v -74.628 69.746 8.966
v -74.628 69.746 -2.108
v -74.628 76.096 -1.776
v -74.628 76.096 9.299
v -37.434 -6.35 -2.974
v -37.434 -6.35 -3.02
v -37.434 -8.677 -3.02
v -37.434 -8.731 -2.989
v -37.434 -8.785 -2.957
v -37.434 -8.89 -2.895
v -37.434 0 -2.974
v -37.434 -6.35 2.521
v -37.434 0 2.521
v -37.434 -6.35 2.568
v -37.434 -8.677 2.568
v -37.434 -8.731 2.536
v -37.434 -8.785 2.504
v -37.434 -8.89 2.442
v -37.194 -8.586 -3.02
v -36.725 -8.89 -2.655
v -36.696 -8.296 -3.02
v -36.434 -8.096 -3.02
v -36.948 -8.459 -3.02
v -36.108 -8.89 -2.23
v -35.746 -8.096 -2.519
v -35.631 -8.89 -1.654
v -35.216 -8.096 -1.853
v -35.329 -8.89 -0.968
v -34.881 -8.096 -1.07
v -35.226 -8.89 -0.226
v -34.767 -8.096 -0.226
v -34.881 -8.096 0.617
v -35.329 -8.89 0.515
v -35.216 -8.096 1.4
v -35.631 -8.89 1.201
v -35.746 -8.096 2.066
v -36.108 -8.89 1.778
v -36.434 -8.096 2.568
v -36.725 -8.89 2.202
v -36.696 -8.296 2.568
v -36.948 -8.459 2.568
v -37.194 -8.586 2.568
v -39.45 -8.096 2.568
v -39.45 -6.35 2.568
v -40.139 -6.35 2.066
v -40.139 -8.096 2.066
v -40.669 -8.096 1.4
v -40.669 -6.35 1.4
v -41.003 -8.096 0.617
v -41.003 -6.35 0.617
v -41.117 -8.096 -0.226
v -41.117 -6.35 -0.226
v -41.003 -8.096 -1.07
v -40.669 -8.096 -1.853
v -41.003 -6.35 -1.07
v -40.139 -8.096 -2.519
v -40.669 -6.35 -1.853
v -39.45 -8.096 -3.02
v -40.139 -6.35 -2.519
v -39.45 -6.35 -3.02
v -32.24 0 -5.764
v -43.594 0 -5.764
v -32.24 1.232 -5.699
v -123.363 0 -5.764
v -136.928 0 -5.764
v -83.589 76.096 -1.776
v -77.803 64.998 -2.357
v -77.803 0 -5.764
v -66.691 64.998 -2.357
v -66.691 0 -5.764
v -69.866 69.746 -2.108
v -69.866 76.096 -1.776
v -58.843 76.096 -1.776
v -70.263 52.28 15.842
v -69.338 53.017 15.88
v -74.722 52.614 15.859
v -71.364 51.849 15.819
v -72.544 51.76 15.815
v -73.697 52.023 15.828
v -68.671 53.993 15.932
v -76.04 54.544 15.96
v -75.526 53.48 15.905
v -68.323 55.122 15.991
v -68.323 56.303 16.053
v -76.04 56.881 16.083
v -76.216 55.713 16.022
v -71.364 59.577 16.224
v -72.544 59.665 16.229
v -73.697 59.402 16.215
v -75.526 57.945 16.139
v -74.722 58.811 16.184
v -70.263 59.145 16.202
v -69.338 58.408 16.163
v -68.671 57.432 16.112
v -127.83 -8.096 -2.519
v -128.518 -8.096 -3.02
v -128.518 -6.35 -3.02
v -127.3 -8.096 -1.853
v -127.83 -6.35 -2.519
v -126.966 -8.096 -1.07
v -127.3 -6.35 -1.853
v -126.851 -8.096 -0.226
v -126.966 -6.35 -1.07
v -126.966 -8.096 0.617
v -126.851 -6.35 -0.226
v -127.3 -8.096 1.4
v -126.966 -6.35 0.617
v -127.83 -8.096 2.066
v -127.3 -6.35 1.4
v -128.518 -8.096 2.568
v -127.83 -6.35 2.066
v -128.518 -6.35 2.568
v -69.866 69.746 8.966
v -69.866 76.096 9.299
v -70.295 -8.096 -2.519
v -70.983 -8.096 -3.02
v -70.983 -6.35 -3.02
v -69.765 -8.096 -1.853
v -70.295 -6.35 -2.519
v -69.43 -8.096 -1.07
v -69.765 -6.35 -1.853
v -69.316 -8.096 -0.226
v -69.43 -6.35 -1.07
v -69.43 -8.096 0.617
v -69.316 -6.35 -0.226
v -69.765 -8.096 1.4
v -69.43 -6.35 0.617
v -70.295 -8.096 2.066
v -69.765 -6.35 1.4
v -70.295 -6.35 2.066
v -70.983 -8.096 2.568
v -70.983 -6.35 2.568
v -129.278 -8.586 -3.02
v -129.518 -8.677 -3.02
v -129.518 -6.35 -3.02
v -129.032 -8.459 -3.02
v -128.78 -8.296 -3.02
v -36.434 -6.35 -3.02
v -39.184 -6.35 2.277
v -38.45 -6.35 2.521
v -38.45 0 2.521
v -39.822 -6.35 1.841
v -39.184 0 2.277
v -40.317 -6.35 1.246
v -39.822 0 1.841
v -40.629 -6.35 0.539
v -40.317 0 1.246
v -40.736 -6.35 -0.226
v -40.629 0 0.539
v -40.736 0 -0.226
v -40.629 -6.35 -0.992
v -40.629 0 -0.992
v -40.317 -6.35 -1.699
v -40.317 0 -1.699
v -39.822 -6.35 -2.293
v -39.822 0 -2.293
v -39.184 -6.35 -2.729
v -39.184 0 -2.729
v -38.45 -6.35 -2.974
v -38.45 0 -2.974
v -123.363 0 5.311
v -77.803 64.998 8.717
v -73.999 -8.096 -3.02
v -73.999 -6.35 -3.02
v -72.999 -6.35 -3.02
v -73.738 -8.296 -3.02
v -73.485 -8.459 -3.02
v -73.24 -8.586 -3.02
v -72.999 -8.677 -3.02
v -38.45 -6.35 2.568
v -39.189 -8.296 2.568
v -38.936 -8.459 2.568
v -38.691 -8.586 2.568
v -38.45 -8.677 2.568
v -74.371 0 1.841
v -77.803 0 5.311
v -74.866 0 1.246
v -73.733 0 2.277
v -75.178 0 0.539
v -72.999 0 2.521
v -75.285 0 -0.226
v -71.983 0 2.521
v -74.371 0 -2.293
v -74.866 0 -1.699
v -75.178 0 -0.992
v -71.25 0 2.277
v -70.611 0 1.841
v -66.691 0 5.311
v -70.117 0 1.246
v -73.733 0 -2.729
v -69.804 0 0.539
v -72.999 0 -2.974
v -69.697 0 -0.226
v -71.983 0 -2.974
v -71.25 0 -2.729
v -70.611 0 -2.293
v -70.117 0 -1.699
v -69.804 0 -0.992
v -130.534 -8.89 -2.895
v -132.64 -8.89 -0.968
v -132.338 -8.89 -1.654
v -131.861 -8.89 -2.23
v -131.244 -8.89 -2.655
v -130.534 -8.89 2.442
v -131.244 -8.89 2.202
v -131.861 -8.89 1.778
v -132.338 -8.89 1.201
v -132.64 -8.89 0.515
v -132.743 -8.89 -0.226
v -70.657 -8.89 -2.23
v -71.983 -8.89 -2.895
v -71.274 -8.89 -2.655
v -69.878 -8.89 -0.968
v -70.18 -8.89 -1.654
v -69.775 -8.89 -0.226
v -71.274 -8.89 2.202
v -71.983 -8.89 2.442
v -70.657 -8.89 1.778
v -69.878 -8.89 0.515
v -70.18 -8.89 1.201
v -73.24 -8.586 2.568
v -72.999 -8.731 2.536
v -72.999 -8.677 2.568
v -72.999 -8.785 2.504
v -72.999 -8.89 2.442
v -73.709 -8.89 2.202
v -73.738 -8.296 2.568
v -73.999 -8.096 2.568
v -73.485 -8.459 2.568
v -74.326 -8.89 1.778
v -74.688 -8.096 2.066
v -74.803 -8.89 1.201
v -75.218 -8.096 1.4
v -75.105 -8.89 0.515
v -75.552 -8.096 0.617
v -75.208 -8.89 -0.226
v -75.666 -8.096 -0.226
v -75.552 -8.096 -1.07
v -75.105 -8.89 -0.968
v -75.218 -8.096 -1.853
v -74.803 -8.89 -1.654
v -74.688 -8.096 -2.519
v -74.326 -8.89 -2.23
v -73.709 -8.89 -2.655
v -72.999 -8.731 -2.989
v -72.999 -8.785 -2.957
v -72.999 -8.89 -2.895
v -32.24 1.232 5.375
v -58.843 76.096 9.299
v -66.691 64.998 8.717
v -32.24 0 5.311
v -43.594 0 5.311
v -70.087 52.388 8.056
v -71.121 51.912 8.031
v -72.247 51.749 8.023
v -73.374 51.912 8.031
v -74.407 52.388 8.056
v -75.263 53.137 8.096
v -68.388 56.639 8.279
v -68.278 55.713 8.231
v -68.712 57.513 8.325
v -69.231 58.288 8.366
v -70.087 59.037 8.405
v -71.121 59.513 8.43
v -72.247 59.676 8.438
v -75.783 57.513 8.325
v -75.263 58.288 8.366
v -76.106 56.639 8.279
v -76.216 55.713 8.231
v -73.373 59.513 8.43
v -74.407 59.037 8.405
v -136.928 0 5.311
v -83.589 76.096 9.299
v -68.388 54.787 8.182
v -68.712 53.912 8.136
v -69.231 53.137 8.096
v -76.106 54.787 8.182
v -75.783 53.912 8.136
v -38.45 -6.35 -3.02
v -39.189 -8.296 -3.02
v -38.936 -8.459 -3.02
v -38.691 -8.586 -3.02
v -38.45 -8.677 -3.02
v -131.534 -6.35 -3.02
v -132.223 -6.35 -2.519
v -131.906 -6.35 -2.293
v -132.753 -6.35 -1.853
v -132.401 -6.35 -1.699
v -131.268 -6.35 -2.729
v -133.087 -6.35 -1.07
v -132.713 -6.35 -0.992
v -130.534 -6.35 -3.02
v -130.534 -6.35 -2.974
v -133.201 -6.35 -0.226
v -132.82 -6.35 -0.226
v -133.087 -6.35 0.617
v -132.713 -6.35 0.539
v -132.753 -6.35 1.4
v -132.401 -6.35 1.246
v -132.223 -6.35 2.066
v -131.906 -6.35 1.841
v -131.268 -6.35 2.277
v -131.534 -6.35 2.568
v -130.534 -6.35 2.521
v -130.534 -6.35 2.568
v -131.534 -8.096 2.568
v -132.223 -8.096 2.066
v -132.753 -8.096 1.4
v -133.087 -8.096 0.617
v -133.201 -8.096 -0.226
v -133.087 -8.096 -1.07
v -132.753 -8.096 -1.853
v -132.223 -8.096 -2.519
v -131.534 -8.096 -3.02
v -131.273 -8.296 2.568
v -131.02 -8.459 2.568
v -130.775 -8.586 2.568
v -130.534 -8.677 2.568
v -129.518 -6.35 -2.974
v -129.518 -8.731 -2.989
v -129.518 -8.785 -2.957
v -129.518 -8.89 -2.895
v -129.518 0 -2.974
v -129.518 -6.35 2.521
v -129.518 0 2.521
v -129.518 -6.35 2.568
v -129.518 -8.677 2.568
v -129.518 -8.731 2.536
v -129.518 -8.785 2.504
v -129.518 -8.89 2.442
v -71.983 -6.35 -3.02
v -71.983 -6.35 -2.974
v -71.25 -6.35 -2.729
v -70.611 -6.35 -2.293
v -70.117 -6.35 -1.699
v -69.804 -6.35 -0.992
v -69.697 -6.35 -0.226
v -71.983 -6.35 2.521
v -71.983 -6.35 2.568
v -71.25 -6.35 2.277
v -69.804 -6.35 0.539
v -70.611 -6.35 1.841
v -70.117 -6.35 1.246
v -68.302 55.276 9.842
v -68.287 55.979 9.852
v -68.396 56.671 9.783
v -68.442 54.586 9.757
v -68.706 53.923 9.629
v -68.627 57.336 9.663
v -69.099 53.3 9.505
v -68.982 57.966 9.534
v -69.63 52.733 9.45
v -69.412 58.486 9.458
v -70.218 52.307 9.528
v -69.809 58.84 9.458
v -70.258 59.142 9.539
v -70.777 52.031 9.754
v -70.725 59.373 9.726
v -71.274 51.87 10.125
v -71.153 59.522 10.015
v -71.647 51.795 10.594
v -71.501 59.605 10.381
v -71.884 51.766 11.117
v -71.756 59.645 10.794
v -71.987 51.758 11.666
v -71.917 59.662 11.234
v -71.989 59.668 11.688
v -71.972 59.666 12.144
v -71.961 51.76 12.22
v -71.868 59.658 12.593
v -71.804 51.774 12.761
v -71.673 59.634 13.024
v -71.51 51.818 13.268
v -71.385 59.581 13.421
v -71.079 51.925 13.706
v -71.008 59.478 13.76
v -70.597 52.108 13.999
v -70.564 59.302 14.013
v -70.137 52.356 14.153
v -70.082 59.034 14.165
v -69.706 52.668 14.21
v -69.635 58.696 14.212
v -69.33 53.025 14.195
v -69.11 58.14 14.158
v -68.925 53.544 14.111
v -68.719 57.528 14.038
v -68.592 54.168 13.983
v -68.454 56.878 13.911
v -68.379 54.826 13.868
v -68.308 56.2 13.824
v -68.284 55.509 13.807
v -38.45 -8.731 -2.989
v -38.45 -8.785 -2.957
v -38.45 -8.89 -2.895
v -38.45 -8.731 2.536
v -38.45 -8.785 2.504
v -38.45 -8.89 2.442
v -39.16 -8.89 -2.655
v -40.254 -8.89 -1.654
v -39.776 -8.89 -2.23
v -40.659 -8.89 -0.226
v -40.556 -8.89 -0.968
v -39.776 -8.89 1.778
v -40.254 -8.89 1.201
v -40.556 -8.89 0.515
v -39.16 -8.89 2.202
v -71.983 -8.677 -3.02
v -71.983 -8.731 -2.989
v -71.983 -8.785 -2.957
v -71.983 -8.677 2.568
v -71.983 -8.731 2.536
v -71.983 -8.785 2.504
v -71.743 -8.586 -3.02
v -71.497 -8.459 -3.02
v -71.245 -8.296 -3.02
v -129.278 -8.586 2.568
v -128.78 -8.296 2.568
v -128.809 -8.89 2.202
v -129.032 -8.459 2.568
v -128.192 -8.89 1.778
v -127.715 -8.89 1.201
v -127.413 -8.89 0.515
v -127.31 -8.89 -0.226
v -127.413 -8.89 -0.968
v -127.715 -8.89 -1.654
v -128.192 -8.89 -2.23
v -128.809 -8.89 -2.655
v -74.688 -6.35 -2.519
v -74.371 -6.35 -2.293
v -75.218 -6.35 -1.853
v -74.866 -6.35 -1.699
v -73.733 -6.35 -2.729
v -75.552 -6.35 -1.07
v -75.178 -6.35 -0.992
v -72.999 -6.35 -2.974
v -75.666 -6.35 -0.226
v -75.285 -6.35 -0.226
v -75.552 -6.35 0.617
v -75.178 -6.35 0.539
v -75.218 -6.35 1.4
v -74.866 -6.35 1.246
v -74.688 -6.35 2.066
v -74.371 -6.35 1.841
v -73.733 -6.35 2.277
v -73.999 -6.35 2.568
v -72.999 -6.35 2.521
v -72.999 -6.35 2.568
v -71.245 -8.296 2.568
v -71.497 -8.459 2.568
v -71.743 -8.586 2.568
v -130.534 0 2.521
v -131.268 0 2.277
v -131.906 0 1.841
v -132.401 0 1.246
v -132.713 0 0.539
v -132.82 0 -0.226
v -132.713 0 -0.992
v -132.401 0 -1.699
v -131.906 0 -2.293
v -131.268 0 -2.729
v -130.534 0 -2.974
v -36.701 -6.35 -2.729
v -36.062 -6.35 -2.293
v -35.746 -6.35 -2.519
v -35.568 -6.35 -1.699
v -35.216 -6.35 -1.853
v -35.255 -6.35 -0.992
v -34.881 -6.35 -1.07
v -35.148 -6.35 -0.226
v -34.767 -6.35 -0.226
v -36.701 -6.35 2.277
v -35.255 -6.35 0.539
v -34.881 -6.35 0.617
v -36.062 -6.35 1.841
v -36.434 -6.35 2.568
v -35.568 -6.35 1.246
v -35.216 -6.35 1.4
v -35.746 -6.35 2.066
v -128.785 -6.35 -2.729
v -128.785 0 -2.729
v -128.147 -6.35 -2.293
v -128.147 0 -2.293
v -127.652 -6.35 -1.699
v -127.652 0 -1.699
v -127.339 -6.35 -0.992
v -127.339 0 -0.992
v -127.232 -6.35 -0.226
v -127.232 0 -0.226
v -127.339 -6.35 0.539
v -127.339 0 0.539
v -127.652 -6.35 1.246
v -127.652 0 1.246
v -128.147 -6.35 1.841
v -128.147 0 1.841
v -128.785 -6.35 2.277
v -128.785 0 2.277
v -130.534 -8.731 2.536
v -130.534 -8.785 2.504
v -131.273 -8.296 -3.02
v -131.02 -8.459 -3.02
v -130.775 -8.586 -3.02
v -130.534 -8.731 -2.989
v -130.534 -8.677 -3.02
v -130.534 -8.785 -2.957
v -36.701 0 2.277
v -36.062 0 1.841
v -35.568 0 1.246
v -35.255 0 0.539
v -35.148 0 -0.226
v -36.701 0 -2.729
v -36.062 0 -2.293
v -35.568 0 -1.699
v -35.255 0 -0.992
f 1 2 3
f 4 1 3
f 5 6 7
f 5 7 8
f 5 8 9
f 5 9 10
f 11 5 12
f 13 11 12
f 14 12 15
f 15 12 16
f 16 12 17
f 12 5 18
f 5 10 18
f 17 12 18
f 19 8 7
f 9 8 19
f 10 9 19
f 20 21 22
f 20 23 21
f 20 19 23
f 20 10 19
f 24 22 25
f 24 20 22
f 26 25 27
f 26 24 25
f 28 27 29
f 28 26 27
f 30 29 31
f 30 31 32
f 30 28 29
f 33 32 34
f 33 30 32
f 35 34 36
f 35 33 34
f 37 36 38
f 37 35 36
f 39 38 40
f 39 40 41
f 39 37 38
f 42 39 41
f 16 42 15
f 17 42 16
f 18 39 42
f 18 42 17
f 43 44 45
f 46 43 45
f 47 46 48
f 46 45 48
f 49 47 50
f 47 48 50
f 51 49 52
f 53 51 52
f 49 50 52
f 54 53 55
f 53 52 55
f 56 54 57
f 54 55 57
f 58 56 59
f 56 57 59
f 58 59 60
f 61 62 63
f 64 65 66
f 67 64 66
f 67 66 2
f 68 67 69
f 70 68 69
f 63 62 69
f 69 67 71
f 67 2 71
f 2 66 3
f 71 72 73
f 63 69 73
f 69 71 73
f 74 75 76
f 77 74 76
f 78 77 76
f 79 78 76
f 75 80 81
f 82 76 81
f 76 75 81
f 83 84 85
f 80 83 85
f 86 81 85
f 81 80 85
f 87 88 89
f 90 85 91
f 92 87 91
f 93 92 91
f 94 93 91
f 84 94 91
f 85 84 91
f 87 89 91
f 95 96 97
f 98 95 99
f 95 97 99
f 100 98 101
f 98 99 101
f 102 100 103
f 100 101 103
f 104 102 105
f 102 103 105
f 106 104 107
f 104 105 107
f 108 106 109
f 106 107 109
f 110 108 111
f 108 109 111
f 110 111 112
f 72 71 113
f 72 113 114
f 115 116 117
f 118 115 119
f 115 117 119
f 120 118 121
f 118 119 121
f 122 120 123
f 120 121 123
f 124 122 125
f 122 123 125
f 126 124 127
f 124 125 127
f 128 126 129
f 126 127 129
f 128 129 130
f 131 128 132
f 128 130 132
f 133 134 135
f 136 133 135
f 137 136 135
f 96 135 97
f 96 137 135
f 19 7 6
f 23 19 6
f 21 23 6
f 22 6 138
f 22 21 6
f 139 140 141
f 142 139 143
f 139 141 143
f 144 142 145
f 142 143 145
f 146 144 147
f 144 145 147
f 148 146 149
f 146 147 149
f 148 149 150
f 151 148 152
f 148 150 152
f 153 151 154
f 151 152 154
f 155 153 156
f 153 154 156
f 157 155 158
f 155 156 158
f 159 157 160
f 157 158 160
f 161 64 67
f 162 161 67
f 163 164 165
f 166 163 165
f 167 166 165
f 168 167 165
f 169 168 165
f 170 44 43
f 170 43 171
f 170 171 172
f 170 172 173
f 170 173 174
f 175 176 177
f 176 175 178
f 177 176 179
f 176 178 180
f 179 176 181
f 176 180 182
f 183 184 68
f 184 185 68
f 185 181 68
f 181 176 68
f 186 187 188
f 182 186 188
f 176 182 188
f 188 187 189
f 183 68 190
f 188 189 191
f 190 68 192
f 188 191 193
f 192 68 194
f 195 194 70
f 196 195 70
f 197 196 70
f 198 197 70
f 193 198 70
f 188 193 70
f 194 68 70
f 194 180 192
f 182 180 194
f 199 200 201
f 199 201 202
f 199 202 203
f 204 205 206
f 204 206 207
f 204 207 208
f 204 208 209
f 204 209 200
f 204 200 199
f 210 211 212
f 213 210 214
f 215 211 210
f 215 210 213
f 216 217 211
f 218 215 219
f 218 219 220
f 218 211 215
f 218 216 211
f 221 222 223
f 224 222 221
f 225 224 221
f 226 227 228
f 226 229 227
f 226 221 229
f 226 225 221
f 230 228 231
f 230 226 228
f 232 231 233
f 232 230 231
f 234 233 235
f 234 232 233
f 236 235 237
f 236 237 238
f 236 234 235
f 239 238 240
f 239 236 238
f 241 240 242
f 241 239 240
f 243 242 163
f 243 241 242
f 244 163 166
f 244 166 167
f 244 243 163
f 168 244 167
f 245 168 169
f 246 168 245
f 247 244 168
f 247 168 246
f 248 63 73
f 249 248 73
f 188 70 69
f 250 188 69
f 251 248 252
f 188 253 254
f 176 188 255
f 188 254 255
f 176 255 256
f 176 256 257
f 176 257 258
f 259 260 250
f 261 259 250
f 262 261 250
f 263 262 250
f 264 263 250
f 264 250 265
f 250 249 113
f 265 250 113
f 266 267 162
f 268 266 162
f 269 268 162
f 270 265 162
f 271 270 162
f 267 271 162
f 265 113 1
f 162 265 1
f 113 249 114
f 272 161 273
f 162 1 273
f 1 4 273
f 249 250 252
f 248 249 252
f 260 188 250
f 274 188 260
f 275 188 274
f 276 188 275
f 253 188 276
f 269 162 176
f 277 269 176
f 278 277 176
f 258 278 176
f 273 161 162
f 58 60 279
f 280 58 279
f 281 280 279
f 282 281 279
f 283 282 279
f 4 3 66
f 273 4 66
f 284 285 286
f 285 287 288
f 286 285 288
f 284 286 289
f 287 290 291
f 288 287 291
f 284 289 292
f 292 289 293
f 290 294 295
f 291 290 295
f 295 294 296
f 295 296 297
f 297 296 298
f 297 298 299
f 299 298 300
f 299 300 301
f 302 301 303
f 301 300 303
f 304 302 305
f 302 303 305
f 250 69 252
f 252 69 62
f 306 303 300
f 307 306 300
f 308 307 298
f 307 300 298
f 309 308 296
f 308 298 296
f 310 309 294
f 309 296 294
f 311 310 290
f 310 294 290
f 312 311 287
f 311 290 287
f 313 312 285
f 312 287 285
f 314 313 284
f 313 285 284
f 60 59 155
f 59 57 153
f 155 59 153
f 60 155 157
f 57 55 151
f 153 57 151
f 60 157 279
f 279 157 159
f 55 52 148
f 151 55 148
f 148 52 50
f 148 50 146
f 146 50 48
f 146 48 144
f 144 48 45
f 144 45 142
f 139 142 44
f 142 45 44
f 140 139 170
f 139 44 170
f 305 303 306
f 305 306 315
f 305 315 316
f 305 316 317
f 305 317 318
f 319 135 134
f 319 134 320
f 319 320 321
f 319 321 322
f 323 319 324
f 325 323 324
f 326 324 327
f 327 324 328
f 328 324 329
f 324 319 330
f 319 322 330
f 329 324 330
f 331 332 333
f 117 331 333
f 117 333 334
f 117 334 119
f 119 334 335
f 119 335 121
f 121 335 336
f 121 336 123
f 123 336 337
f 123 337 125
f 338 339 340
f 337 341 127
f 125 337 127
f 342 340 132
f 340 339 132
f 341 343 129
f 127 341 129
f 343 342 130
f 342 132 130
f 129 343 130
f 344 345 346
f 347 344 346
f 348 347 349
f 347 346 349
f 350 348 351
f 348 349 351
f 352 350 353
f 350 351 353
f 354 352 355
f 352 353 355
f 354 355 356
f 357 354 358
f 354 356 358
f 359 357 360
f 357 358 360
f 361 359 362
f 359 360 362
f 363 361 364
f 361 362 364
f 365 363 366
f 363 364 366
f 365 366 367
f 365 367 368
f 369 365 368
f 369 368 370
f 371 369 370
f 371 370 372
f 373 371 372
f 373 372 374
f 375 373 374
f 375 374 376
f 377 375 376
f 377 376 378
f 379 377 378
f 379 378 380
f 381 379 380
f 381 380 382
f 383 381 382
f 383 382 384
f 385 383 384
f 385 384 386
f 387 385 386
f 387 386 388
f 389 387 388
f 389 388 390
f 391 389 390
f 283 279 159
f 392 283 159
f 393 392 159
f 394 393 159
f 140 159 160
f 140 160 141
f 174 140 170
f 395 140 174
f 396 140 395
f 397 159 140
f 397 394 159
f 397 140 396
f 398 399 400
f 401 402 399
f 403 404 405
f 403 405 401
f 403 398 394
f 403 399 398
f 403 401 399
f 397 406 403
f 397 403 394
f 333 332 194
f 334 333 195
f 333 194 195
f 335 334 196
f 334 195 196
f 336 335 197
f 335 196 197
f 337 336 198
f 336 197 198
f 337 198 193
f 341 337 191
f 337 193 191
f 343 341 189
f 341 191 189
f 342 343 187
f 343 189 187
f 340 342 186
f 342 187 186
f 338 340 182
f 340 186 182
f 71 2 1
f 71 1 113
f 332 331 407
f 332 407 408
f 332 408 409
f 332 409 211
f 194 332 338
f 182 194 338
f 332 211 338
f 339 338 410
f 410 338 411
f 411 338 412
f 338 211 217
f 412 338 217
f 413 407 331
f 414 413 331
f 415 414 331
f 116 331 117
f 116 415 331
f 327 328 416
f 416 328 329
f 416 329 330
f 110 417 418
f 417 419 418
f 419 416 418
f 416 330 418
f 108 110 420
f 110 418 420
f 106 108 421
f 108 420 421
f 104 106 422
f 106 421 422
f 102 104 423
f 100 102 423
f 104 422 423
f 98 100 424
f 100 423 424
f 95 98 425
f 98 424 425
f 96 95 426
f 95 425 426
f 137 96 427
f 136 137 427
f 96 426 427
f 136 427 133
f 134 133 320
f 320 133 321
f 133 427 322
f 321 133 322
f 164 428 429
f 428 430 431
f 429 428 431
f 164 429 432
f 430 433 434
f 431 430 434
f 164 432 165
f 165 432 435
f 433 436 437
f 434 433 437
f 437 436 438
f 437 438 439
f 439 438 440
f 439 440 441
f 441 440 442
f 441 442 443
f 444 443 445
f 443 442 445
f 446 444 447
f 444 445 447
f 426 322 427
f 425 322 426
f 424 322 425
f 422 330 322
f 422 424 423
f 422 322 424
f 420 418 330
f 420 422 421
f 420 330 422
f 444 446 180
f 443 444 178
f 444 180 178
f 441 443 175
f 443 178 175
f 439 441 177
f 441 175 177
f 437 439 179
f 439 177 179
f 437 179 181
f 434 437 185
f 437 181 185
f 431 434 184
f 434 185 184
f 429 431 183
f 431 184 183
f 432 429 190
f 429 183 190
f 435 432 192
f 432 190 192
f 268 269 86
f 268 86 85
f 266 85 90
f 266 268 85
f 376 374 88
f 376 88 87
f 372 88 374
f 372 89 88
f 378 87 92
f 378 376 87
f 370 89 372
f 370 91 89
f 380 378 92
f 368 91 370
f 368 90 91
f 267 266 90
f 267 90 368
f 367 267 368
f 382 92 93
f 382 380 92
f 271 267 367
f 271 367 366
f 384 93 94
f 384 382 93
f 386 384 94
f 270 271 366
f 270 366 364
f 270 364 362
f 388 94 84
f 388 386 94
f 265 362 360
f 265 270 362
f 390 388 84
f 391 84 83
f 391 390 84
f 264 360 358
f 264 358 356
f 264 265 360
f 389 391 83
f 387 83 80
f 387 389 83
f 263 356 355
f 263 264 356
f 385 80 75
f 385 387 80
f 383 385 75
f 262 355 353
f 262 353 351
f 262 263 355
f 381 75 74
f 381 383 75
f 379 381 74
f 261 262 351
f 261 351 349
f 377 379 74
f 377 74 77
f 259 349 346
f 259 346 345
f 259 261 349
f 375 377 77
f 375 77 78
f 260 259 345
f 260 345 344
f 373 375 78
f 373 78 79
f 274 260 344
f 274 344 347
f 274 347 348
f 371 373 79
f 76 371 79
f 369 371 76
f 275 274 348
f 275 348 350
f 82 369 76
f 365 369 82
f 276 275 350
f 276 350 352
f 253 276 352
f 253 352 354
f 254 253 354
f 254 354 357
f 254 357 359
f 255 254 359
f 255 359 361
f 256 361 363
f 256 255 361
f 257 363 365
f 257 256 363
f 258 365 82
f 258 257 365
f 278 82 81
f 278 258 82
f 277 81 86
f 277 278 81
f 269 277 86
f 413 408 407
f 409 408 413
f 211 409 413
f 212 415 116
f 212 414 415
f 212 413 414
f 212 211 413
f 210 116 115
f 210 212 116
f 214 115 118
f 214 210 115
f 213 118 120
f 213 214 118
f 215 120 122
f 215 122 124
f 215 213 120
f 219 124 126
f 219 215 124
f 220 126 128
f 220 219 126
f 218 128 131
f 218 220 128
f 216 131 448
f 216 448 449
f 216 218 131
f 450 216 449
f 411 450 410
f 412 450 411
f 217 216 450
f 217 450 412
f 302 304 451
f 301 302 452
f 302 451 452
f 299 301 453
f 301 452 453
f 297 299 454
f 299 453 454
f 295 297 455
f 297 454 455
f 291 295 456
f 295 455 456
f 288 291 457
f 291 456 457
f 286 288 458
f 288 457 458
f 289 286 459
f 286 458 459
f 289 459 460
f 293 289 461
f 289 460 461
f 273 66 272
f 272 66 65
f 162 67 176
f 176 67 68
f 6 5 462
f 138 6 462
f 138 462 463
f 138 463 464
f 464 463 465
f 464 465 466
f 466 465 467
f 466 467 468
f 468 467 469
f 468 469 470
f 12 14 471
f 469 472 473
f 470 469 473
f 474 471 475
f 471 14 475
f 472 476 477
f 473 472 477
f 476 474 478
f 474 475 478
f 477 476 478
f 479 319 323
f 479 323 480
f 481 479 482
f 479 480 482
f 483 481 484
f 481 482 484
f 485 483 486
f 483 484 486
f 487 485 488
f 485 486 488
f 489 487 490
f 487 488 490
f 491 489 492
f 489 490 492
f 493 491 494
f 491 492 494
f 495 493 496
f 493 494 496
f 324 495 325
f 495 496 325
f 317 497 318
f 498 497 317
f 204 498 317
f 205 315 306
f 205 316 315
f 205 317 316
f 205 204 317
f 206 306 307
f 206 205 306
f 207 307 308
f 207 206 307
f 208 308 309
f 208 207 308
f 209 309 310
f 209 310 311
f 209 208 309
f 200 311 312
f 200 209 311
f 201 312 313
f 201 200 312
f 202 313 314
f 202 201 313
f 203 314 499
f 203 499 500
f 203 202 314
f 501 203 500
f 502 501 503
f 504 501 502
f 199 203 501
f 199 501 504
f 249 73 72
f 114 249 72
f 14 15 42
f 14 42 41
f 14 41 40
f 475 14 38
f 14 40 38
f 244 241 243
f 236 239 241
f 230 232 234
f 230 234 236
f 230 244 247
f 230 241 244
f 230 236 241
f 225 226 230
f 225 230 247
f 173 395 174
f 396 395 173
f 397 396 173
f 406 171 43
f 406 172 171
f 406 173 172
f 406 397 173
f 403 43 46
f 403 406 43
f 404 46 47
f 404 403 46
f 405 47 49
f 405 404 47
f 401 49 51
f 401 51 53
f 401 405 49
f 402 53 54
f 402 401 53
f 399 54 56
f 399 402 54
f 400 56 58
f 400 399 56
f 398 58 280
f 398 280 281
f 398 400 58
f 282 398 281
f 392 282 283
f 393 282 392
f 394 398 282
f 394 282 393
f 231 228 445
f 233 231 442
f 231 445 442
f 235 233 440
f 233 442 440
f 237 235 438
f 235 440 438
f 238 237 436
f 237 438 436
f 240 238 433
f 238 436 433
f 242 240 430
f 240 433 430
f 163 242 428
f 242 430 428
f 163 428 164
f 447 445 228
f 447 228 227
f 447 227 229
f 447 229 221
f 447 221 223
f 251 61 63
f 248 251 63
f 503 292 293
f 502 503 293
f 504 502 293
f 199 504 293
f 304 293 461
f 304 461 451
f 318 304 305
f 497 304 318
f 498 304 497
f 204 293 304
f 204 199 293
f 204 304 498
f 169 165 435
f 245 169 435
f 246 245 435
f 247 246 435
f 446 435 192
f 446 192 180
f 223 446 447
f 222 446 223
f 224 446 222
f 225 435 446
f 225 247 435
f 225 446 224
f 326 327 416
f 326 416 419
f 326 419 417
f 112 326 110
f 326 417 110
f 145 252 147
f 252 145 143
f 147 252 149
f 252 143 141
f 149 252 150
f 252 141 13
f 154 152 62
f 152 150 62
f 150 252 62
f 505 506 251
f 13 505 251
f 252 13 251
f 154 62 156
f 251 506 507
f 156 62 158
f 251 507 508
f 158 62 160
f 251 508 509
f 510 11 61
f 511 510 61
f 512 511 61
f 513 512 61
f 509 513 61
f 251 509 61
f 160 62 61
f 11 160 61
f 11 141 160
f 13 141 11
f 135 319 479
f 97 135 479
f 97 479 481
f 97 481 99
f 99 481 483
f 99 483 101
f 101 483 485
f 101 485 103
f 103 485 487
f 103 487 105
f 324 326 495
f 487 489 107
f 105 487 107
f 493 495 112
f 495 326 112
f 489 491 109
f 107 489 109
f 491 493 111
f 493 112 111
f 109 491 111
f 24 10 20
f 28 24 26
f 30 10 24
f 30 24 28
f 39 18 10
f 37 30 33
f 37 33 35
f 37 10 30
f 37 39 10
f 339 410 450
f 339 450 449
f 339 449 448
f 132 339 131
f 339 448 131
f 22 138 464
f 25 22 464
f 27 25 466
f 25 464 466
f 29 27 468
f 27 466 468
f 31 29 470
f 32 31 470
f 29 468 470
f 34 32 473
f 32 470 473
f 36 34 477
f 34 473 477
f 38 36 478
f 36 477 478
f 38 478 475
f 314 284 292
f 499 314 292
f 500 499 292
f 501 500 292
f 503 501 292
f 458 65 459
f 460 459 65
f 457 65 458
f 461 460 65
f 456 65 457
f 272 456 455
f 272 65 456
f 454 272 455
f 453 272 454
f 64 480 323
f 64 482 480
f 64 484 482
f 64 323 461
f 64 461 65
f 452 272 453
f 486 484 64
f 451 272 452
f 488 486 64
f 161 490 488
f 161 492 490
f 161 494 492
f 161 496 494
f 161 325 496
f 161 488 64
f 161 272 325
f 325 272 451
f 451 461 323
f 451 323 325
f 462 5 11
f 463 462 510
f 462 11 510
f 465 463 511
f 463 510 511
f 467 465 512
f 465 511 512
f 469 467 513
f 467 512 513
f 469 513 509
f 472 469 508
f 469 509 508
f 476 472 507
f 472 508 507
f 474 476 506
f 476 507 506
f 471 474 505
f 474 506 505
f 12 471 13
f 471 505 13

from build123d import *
from OCP.BRepFilletAPI import BRepFilletAPI_MakeChamfer

# Parameters (mm, degrees)
BOSS_EXTRUDE2_DEPTH     = 11.0744
CUT_EXTRUDE1_DEPTH      = 157.927278758
CUT_EXTRUDE1_DEPTH_BACK = 157.927278758
SKETCH3_W               = 4.7625
SKETCH3_H               = 6.35
CUT_EXTRUDE6_DEPTH      = 157.927278758
CUT_EXTRUDE6_DEPTH_BACK = 157.927278758
SKETCH12_W              = 1.27
SKETCH12_H              = 1.27
SKETCH12_W_2            = 12.7
SKETCH12_H_2            = 12.7
SKETCH13_R              = 2.794
BOSS_EXTRUDE3_DEPTH     = 6.35
SKETCH14_R              = 3.175
BOSS_EXTRUDE4_DEPTH     = 2.54
CUT_EXTRUDE7_REACH      = 163.425
SKETCH15_W              = 1.016
SKETCH15_H              = 6.35
SKETCH15_W_2            = 3.01608289
SKETCH15_H_2            = 0.381
SKETCH15_W_3            = 3.016082891
SKETCH17_R              = 3.96875
BOSS_EXTRUDE5_DEPTH     = 16.32204
SKETCH18_R              = 2.38125
CUT_EXTRUDE9_DEPTH      = 5.334
CHAMFER1_SIZE           = 0.79375
CHAMFER1_SIZE2          = 0.458271776
SKETCH19_W              = 6.0325
SKETCH19_H              = 64.754314085
BOSS_EXTRUDE6_DEPTH     = 8.542621607


with BuildPart() as part:
    # Sketch2 → Boss-Extrude2 (new, along a direction that is not the sketch's normal)
    with BuildSketch(Plane(origin=(0, 0.301230094, -5.747812595), x_dir=(1, 0, 0), z_dir=(0, -0.052335956242947394, 0.9986295347545737))):
        Polygon((-31.802314895, -0.301643486), (-58.84283214, 75.898356514), (-83.589254333, 75.898356514), (-136.927598646, -0.301643486), (-123.363202182, -0.301643486), (-77.803366414, 64.785856514), (-77.803366414, -0.301643486), (-66.690866414, -0.301643486), (-66.690866414, 64.785856514), (-43.593757934, -0.301643486), align=None)
    extrude(amount=BOSS_EXTRUDE2_DEPTH, dir=(0, 0, 1))

    # Sketch3 → Cut-Extrude1 (cut, two sides: drawn at the far end of the back side and taken through both)
    with BuildSketch(Plane.XY.offset(-CUT_EXTRUDE1_DEPTH_BACK)):
        with Locations((-72.247116414, 72.920570548)):
            Rectangle(SKETCH3_W, SKETCH3_H)
    extrude(amount=CUT_EXTRUDE1_DEPTH + CUT_EXTRUDE1_DEPTH_BACK, mode=Mode.SUBTRACT)

    # Sketch12 → Cut-Extrude6 (cut, two sides: drawn at the far end of the back side and taken through both)
    with BuildSketch(Plane.XY.offset(-CUT_EXTRUDE6_DEPTH_BACK)):
        with Locations((-31.604957934, 0.635)):
            Rectangle(SKETCH12_W, SKETCH12_H)
        with Locations((-144.150562182, 6.35)):
            Rectangle(SKETCH12_W_2, SKETCH12_H_2)
    extrude(amount=CUT_EXTRUDE6_DEPTH + CUT_EXTRUDE6_DEPTH_BACK, mode=Mode.SUBTRACT)

    # Shell13: read off the stored shape, not the designer's step
    # Shell13: loft between two sections, ruled curve by curve
    shell13_from = [
        Edge.make_line((-41.800744563, 2.54, -3.086997877), (-67.036086729, 73.555570548, 0.63477047)),
        Edge.make_line((-60.635845511, 73.555570548, 0.63477047), (-35.400503345, 2.54, -3.086997877)),
        Edge.make_line((-35.400503345, 2.54, -3.086997877), (-41.800744563, 2.54, -3.086997877)),
        Edge.make_line((-67.036086729, 73.555570548, 0.63477047), (-60.635845511, 73.555570548, 0.63477047)),
    ]
    shell13_to = [
        Edge.make_line((-41.800744563, 2.54, 5.443916364), (-67.036086729, 73.555570548, 9.165684711)),
        Edge.make_line((-60.635845511, 73.555570548, 9.165684711), (-35.400503345, 2.54, 5.443916364)),
        Edge.make_line((-35.400503345, 2.54, 5.443916364), (-41.800744563, 2.54, 5.443916364)),
        Edge.make_line((-67.036086729, 73.555570548, 9.165684711), (-60.635845511, 73.555570548, 9.165684711)),
    ]
    shell13 = Solid(Shell([*[Face.make_surface_from_curves(shell13_from[k], shell13_to[k]) for k in range(4)], Face(Wire(shell13_from)), Face(Wire(shell13_to))]))
    add(shell13, mode=Mode.SUBTRACT)

    # Shell13 2: loft between two sections, ruled curve by curve
    shell13_2_from = [
        Edge.make_line((-75.263366414, 2.54, -3.086997877), (-69.230866414, 2.54, -3.086997877)),
        Edge.make_line((-69.230866414, 67.205570548, 0.301981071), (-75.263366414, 67.205570548, 0.301981071)),
        Edge.make_line((-69.230866414, 2.54, -3.086997877), (-69.230866414, 67.205570548, 0.301981071)),
        Edge.make_line((-75.263366414, 67.205570548, 0.301981071), (-75.263366414, 2.54, -3.086997877)),
    ]
    shell13_2_to = [
        Edge.make_line((-75.263366414, 2.54, 5.443916364), (-69.230866414, 2.54, 5.443916364)),
        Edge.make_line((-69.230866414, 67.205570548, 8.832895312), (-75.263366414, 67.205570548, 8.832895312)),
        Edge.make_line((-69.230866414, 2.54, 5.443916364), (-69.230866414, 67.205570548, 8.832895312)),
        Edge.make_line((-75.263366414, 67.205570548, 8.832895312), (-75.263366414, 2.54, 5.443916364)),
    ]
    shell13_2 = Solid(Shell([*[Face.make_surface_from_curves(shell13_2_from[k], shell13_2_to[k]) for k in range(4)], Face(Wire(shell13_2_from)), Face(Wire(shell13_2_to))]))
    add(shell13_2, mode=Mode.SUBTRACT)

    # Shell13 3: loft between two sections, ruled curve by curve
    shell13_3_from = [
        Edge.make_line((-132.045380565, 2.54, -3.086997877), (-124.684650731, 2.54, -3.086997877)),
        Edge.make_line((-77.168366414, 73.555570548, 0.63477047), (-82.267805784, 73.555570548, 0.63477047)),
        Edge.make_line((-82.267805784, 73.555570548, 0.63477047), (-132.045380565, 2.54, -3.086997877)),
        Edge.make_line((-124.684650731, 2.54, -3.086997877), (-77.168366414, 70.329482632, 0.465698366)),
        Edge.make_line((-77.168366414, 70.329482632, 0.465698366), (-77.168366414, 73.555570548, 0.63477047)),
    ]
    shell13_3_to = [
        Edge.make_line((-132.045380565, 2.54, 5.443916364), (-124.684650731, 2.54, 5.443916364)),
        Edge.make_line((-77.168366414, 73.555570548, 9.165684711), (-82.267805784, 73.555570548, 9.165684711)),
        Edge.make_line((-82.267805784, 73.555570548, 9.165684711), (-132.045380565, 2.54, 5.443916364)),
        Edge.make_line((-124.684650731, 2.54, 5.443916364), (-77.168366414, 70.329482632, 8.996612607)),
        Edge.make_line((-77.168366414, 70.329482632, 8.996612607), (-77.168366414, 73.555570548, 9.165684711)),
    ]
    shell13_3 = Solid(Shell([*[Face.make_surface_from_curves(shell13_3_from[k], shell13_3_to[k]) for k in range(5)], Face(Wire(shell13_3_from)), Face(Wire(shell13_3_to))]))
    add(shell13_3, mode=Mode.SUBTRACT)

    # Sketch13 → Boss-Extrude3 (add)
    with BuildSketch(Plane.XZ):
        with Locations(Location((-130.026418646, -0.226399396, 0), (0, 0, 90))):
            Circle(SKETCH13_R)
        with Locations(Location((-72.491337934, -0.226399396, 0), (0, 0, 180))):
            Circle(SKETCH13_R)
        with Locations(Location((-37.942257934, -0.226399396, 0), (0, 0, 180))):
            Circle(SKETCH13_R)
    extrude(amount=BOSS_EXTRUDE3_DEPTH)

    # Sketch14 → Boss-Extrude4 (add)
    with BuildSketch(Plane.XZ.offset(6.35)):
        with Locations((-130.026418646, -0.226399396)):
            Circle(SKETCH14_R)
        with Locations((-72.491337934, -0.226399396)):
            Circle(SKETCH14_R)
        with Locations((-37.942257934, -0.226399396)):
            Circle(SKETCH14_R)
    extrude(amount=BOSS_EXTRUDE4_DEPTH)

    # Cut-Extrude7: up to this face of the body (flat: up to its plane)
    cut_extrude7_end = Plane(part.part.faces().sort_by_distance((-136.752488628, 0, -0.226399396))[0])
    # Sketch15 → Cut-Extrude7 (cut, up to the picked face)
    with BuildSketch(Plane.XZ.offset(8.89), mode=Mode.PRIVATE) as cut_extrude7_sk1:
        with Locations((-130.026418646, -0.226399396)):
            Rectangle(SKETCH15_W, SKETCH15_H)
    cut_extrude7_tool1 = split(extrude(cut_extrude7_sk1.sketch, amount=-CUT_EXTRUDE7_REACH, mode=Mode.PRIVATE), bisect_by=cut_extrude7_end, keep=Keep.BOTH, mode=Mode.PRIVATE)
    # Sketch15 → Cut-Extrude7 (cut, up to the picked face)
    with BuildSketch(Plane.XZ.offset(8.89), mode=Mode.PRIVATE) as cut_extrude7_sk2:
        with Locations((-72.491337934, -0.226399396)):
            Rectangle(SKETCH15_W, SKETCH15_H)
    cut_extrude7_tool2 = split(extrude(cut_extrude7_sk2.sketch, amount=-CUT_EXTRUDE7_REACH, mode=Mode.PRIVATE), bisect_by=cut_extrude7_end, keep=Keep.BOTH, mode=Mode.PRIVATE)
    # Sketch15 → Cut-Extrude7 (cut, up to the picked face)
    with BuildSketch(Plane.XZ.offset(8.89), mode=Mode.PRIVATE) as cut_extrude7_sk3:
        with Locations((-37.942257934, -0.226399396)):
            Rectangle(SKETCH15_W, SKETCH15_H)
    cut_extrude7_tool3 = split(extrude(cut_extrude7_sk3.sketch, amount=-CUT_EXTRUDE7_REACH, mode=Mode.PRIVATE), bisect_by=cut_extrude7_end, keep=Keep.BOTH, mode=Mode.PRIVATE)
    # Sketch15 → Cut-Extrude7 (cut, up to the picked face)
    with BuildSketch(Plane.XZ.offset(8.89), mode=Mode.PRIVATE) as cut_extrude7_sk4:
        with Locations((-130.026418646, 2.758100604)):
            Rectangle(SKETCH15_W_2, SKETCH15_H_2)
    cut_extrude7_tool4 = split(extrude(cut_extrude7_sk4.sketch, amount=-CUT_EXTRUDE7_REACH, mode=Mode.PRIVATE), bisect_by=cut_extrude7_end, keep=Keep.BOTH, mode=Mode.PRIVATE)
    # Sketch15 → Cut-Extrude7 (cut, up to the picked face)
    with BuildSketch(Plane.XZ.offset(8.89), mode=Mode.PRIVATE) as cut_extrude7_sk5:
        with Locations((-130.026418646, -3.210899396)):
            Rectangle(SKETCH15_W_2, SKETCH15_H_2)
    cut_extrude7_tool5 = split(extrude(cut_extrude7_sk5.sketch, amount=-CUT_EXTRUDE7_REACH, mode=Mode.PRIVATE), bisect_by=cut_extrude7_end, keep=Keep.BOTH, mode=Mode.PRIVATE)
    # Sketch15 → Cut-Extrude7 (cut, up to the picked face)
    with BuildSketch(Plane.XZ.offset(8.89), mode=Mode.PRIVATE) as cut_extrude7_sk6:
        with Locations((-72.491337934, 2.758100604)):
            Rectangle(SKETCH15_W_3, SKETCH15_H_2)
    cut_extrude7_tool6 = split(extrude(cut_extrude7_sk6.sketch, amount=-CUT_EXTRUDE7_REACH, mode=Mode.PRIVATE), bisect_by=cut_extrude7_end, keep=Keep.BOTH, mode=Mode.PRIVATE)
    # Sketch15 → Cut-Extrude7 (cut, up to the picked face)
    with BuildSketch(Plane.XZ.offset(8.89), mode=Mode.PRIVATE) as cut_extrude7_sk7:
        with Locations((-72.491337934, -3.210899396)):
            Rectangle(SKETCH15_W_3, SKETCH15_H_2)
    cut_extrude7_tool7 = split(extrude(cut_extrude7_sk7.sketch, amount=-CUT_EXTRUDE7_REACH, mode=Mode.PRIVATE), bisect_by=cut_extrude7_end, keep=Keep.BOTH, mode=Mode.PRIVATE)
    # Sketch15 → Cut-Extrude7 (cut, up to the picked face)
    with BuildSketch(Plane.XZ.offset(8.89), mode=Mode.PRIVATE) as cut_extrude7_sk8:
        with Locations((-37.942257934, -3.210899396)):
            Rectangle(SKETCH15_W_3, SKETCH15_H_2)
    cut_extrude7_tool8 = split(extrude(cut_extrude7_sk8.sketch, amount=-CUT_EXTRUDE7_REACH, mode=Mode.PRIVATE), bisect_by=cut_extrude7_end, keep=Keep.BOTH, mode=Mode.PRIVATE)
    # Sketch15 → Cut-Extrude7 (cut, up to the picked face)
    with BuildSketch(Plane.XZ.offset(8.89), mode=Mode.PRIVATE) as cut_extrude7_sk9:
        with Locations((-37.942257934, 2.758100604)):
            Rectangle(SKETCH15_W_3, SKETCH15_H_2)
    cut_extrude7_tool9 = split(extrude(cut_extrude7_sk9.sketch, amount=-CUT_EXTRUDE7_REACH, mode=Mode.PRIVATE), bisect_by=cut_extrude7_end, keep=Keep.BOTH, mode=Mode.PRIVATE)
    add(cut_extrude7_tool1.solids().sort_by(Axis((-130.026419, -8.89, -0.226399), (0, 1, 0)))[0], mode=Mode.SUBTRACT)
    add(cut_extrude7_tool2.solids().sort_by(Axis((-72.491338, -8.89, -0.226399), (0, 1, 0)))[0], mode=Mode.SUBTRACT)
    add(cut_extrude7_tool3.solids().sort_by(Axis((-37.942258, -8.89, -0.226399), (0, 1, 0)))[0], mode=Mode.SUBTRACT)
    add(cut_extrude7_tool4.solids().sort_by(Axis((-130.026419, -8.89, 2.758101), (0, 1, 0)))[0], mode=Mode.SUBTRACT)
    add(cut_extrude7_tool5.solids().sort_by(Axis((-130.026419, -8.89, -3.210899), (0, 1, 0)))[0], mode=Mode.SUBTRACT)
    add(cut_extrude7_tool6.solids().sort_by(Axis((-72.491338, -8.89, 2.758101), (0, 1, 0)))[0], mode=Mode.SUBTRACT)
    add(cut_extrude7_tool7.solids().sort_by(Axis((-72.491338, -8.89, -3.210899), (0, 1, 0)))[0], mode=Mode.SUBTRACT)
    add(cut_extrude7_tool8.solids().sort_by(Axis((-37.942258, -8.89, -3.210899), (0, 1, 0)))[0], mode=Mode.SUBTRACT)
    add(cut_extrude7_tool9.solids().sort_by(Axis((-37.942258, -8.89, 2.758101), (0, 1, 0)))[0], mode=Mode.SUBTRACT)

    # Sketch17 → Boss-Extrude5 (add, along a direction that is not the sketch's normal)
    with BuildSketch(Plane(origin=(0, 0.168296765, -3.211293577), x_dir=(-1, 0, 0), z_dir=(0, 0.05233595624294736, -0.9986295347545738))):
        with Locations((72.247116414, 55.620532118)):
            Circle(SKETCH17_R)
    extrude(amount=-BOSS_EXTRUDE5_DEPTH, dir=(0, 0, -1))

    # Sketch18 → Cut-Extrude9 (cut, symmetric)
    with BuildSketch(Plane(origin=(0, 56.273410548, 0), x_dir=(1, 0, 0), z_dir=(0, 1, 0))):
        with Locations((-69.611866414, -11.830700158)):
            Circle(SKETCH18_R)
    extrude(amount=CUT_EXTRUDE9_DEPTH, both=True, mode=Mode.SUBTRACT)

    # Chamfer1: one chamfer whose edges measure the first distance from different faces: ONE call of the kernel's chamfer builder (chamfer() names one face for all edges)
    chamfer1_edges_1 = [part.edges().sort_by_distance(p)[0] for p in [
        (-133.201418646, -8.89, -0.226399396),
    ]]
    chamfer1_side_1 = [part.faces().sort_by_distance(p)[0] for p in [
        (-133.201418646, -7.62, -0.226399396),
    ]]
    chamfer1_edges_2 = [part.edges().sort_by_distance(p)[0] for p in [
        (-126.851418646, -8.89, -0.226399396),
    ]]
    chamfer1_side_2 = [part.faces().sort_by_distance(p)[0] for p in [
        (-126.851418646, -7.62, -0.226399396),
    ]]
    chamfer1_edges_3 = [part.edges().sort_by_distance(p)[0] for p in [
        (-75.666337934, -8.89, -0.226399396),
    ]]
    chamfer1_side_3 = [part.faces().sort_by_distance(p)[0] for p in [
        (-75.666337934, -7.62, -0.226399396),
    ]]
    chamfer1_edges_4 = [part.edges().sort_by_distance(p)[0] for p in [
        (-69.316337934, -8.89, -0.226399396),
    ]]
    chamfer1_side_4 = [part.faces().sort_by_distance(p)[0] for p in [
        (-69.316337934, -7.62, -0.226399396),
    ]]
    chamfer1_edges_5 = [part.edges().sort_by_distance(p)[0] for p in [
        (-41.117257934, -8.89, -0.226399396),
    ]]
    chamfer1_side_5 = [part.faces().sort_by_distance(p)[0] for p in [
        (-41.117257934, -7.62, -0.226399396),
    ]]
    chamfer1_edges_6 = [part.edges().sort_by_distance(p)[0] for p in [
        (-34.767257934, -8.89, -0.226399396),
    ]]
    chamfer1_side_6 = [part.faces().sort_by_distance(p)[0] for p in [
        (-34.767257934, -7.62, -0.226399396),
    ]]
    chamfer1 = BRepFilletAPI_MakeChamfer(part.part.solid().wrapped)
    for e in chamfer1_edges_1:
        chamfer1.Add(CHAMFER1_SIZE, CHAMFER1_SIZE2, e.wrapped, chamfer1_side_1[0].wrapped)  # the first distance lies on this face
    for e in chamfer1_edges_2:
        chamfer1.Add(CHAMFER1_SIZE, CHAMFER1_SIZE2, e.wrapped, chamfer1_side_2[0].wrapped)  # the first distance lies on this face
    for e in chamfer1_edges_3:
        chamfer1.Add(CHAMFER1_SIZE, CHAMFER1_SIZE2, e.wrapped, chamfer1_side_3[0].wrapped)  # the first distance lies on this face
    for e in chamfer1_edges_4:
        chamfer1.Add(CHAMFER1_SIZE, CHAMFER1_SIZE2, e.wrapped, chamfer1_side_4[0].wrapped)  # the first distance lies on this face
    for e in chamfer1_edges_5:
        chamfer1.Add(CHAMFER1_SIZE, CHAMFER1_SIZE2, e.wrapped, chamfer1_side_5[0].wrapped)  # the first distance lies on this face
    for e in chamfer1_edges_6:
        chamfer1.Add(CHAMFER1_SIZE, CHAMFER1_SIZE2, e.wrapped, chamfer1_side_6[0].wrapped)  # the first distance lies on this face
    add(Compound.cast(chamfer1.Shape()), mode=Mode.REPLACE)

    # Sketch19 → Boss-Extrude6 (add, along a direction that is not the sketch's normal)
    with BuildSketch(Plane(origin=(0, -0.277564913, 5.296254044), x_dir=(1, 0, 0), z_dir=(0, -0.05233595624294739, 0.9986295347545737))):
        Polygon((-82.267805784, 73.934460069), (-77.168366414, 73.934460069), (-77.168366414, 70.703944844), (-124.684650731, 2.821431587), (-132.045380565, 2.821431587), align=None)
        with Locations((-72.247116414, 35.19858863)):
            Rectangle(SKETCH19_W, SKETCH19_H)
        Polygon((-67.036086729, 73.934460069), (-60.635845511, 73.934460069), (-35.400503345, 2.821431587), (-41.800744563, 2.821431587), align=None)
    extrude(amount=-BOSS_EXTRUDE6_DEPTH, dir=(0, 0, 1))


solid = part.part
